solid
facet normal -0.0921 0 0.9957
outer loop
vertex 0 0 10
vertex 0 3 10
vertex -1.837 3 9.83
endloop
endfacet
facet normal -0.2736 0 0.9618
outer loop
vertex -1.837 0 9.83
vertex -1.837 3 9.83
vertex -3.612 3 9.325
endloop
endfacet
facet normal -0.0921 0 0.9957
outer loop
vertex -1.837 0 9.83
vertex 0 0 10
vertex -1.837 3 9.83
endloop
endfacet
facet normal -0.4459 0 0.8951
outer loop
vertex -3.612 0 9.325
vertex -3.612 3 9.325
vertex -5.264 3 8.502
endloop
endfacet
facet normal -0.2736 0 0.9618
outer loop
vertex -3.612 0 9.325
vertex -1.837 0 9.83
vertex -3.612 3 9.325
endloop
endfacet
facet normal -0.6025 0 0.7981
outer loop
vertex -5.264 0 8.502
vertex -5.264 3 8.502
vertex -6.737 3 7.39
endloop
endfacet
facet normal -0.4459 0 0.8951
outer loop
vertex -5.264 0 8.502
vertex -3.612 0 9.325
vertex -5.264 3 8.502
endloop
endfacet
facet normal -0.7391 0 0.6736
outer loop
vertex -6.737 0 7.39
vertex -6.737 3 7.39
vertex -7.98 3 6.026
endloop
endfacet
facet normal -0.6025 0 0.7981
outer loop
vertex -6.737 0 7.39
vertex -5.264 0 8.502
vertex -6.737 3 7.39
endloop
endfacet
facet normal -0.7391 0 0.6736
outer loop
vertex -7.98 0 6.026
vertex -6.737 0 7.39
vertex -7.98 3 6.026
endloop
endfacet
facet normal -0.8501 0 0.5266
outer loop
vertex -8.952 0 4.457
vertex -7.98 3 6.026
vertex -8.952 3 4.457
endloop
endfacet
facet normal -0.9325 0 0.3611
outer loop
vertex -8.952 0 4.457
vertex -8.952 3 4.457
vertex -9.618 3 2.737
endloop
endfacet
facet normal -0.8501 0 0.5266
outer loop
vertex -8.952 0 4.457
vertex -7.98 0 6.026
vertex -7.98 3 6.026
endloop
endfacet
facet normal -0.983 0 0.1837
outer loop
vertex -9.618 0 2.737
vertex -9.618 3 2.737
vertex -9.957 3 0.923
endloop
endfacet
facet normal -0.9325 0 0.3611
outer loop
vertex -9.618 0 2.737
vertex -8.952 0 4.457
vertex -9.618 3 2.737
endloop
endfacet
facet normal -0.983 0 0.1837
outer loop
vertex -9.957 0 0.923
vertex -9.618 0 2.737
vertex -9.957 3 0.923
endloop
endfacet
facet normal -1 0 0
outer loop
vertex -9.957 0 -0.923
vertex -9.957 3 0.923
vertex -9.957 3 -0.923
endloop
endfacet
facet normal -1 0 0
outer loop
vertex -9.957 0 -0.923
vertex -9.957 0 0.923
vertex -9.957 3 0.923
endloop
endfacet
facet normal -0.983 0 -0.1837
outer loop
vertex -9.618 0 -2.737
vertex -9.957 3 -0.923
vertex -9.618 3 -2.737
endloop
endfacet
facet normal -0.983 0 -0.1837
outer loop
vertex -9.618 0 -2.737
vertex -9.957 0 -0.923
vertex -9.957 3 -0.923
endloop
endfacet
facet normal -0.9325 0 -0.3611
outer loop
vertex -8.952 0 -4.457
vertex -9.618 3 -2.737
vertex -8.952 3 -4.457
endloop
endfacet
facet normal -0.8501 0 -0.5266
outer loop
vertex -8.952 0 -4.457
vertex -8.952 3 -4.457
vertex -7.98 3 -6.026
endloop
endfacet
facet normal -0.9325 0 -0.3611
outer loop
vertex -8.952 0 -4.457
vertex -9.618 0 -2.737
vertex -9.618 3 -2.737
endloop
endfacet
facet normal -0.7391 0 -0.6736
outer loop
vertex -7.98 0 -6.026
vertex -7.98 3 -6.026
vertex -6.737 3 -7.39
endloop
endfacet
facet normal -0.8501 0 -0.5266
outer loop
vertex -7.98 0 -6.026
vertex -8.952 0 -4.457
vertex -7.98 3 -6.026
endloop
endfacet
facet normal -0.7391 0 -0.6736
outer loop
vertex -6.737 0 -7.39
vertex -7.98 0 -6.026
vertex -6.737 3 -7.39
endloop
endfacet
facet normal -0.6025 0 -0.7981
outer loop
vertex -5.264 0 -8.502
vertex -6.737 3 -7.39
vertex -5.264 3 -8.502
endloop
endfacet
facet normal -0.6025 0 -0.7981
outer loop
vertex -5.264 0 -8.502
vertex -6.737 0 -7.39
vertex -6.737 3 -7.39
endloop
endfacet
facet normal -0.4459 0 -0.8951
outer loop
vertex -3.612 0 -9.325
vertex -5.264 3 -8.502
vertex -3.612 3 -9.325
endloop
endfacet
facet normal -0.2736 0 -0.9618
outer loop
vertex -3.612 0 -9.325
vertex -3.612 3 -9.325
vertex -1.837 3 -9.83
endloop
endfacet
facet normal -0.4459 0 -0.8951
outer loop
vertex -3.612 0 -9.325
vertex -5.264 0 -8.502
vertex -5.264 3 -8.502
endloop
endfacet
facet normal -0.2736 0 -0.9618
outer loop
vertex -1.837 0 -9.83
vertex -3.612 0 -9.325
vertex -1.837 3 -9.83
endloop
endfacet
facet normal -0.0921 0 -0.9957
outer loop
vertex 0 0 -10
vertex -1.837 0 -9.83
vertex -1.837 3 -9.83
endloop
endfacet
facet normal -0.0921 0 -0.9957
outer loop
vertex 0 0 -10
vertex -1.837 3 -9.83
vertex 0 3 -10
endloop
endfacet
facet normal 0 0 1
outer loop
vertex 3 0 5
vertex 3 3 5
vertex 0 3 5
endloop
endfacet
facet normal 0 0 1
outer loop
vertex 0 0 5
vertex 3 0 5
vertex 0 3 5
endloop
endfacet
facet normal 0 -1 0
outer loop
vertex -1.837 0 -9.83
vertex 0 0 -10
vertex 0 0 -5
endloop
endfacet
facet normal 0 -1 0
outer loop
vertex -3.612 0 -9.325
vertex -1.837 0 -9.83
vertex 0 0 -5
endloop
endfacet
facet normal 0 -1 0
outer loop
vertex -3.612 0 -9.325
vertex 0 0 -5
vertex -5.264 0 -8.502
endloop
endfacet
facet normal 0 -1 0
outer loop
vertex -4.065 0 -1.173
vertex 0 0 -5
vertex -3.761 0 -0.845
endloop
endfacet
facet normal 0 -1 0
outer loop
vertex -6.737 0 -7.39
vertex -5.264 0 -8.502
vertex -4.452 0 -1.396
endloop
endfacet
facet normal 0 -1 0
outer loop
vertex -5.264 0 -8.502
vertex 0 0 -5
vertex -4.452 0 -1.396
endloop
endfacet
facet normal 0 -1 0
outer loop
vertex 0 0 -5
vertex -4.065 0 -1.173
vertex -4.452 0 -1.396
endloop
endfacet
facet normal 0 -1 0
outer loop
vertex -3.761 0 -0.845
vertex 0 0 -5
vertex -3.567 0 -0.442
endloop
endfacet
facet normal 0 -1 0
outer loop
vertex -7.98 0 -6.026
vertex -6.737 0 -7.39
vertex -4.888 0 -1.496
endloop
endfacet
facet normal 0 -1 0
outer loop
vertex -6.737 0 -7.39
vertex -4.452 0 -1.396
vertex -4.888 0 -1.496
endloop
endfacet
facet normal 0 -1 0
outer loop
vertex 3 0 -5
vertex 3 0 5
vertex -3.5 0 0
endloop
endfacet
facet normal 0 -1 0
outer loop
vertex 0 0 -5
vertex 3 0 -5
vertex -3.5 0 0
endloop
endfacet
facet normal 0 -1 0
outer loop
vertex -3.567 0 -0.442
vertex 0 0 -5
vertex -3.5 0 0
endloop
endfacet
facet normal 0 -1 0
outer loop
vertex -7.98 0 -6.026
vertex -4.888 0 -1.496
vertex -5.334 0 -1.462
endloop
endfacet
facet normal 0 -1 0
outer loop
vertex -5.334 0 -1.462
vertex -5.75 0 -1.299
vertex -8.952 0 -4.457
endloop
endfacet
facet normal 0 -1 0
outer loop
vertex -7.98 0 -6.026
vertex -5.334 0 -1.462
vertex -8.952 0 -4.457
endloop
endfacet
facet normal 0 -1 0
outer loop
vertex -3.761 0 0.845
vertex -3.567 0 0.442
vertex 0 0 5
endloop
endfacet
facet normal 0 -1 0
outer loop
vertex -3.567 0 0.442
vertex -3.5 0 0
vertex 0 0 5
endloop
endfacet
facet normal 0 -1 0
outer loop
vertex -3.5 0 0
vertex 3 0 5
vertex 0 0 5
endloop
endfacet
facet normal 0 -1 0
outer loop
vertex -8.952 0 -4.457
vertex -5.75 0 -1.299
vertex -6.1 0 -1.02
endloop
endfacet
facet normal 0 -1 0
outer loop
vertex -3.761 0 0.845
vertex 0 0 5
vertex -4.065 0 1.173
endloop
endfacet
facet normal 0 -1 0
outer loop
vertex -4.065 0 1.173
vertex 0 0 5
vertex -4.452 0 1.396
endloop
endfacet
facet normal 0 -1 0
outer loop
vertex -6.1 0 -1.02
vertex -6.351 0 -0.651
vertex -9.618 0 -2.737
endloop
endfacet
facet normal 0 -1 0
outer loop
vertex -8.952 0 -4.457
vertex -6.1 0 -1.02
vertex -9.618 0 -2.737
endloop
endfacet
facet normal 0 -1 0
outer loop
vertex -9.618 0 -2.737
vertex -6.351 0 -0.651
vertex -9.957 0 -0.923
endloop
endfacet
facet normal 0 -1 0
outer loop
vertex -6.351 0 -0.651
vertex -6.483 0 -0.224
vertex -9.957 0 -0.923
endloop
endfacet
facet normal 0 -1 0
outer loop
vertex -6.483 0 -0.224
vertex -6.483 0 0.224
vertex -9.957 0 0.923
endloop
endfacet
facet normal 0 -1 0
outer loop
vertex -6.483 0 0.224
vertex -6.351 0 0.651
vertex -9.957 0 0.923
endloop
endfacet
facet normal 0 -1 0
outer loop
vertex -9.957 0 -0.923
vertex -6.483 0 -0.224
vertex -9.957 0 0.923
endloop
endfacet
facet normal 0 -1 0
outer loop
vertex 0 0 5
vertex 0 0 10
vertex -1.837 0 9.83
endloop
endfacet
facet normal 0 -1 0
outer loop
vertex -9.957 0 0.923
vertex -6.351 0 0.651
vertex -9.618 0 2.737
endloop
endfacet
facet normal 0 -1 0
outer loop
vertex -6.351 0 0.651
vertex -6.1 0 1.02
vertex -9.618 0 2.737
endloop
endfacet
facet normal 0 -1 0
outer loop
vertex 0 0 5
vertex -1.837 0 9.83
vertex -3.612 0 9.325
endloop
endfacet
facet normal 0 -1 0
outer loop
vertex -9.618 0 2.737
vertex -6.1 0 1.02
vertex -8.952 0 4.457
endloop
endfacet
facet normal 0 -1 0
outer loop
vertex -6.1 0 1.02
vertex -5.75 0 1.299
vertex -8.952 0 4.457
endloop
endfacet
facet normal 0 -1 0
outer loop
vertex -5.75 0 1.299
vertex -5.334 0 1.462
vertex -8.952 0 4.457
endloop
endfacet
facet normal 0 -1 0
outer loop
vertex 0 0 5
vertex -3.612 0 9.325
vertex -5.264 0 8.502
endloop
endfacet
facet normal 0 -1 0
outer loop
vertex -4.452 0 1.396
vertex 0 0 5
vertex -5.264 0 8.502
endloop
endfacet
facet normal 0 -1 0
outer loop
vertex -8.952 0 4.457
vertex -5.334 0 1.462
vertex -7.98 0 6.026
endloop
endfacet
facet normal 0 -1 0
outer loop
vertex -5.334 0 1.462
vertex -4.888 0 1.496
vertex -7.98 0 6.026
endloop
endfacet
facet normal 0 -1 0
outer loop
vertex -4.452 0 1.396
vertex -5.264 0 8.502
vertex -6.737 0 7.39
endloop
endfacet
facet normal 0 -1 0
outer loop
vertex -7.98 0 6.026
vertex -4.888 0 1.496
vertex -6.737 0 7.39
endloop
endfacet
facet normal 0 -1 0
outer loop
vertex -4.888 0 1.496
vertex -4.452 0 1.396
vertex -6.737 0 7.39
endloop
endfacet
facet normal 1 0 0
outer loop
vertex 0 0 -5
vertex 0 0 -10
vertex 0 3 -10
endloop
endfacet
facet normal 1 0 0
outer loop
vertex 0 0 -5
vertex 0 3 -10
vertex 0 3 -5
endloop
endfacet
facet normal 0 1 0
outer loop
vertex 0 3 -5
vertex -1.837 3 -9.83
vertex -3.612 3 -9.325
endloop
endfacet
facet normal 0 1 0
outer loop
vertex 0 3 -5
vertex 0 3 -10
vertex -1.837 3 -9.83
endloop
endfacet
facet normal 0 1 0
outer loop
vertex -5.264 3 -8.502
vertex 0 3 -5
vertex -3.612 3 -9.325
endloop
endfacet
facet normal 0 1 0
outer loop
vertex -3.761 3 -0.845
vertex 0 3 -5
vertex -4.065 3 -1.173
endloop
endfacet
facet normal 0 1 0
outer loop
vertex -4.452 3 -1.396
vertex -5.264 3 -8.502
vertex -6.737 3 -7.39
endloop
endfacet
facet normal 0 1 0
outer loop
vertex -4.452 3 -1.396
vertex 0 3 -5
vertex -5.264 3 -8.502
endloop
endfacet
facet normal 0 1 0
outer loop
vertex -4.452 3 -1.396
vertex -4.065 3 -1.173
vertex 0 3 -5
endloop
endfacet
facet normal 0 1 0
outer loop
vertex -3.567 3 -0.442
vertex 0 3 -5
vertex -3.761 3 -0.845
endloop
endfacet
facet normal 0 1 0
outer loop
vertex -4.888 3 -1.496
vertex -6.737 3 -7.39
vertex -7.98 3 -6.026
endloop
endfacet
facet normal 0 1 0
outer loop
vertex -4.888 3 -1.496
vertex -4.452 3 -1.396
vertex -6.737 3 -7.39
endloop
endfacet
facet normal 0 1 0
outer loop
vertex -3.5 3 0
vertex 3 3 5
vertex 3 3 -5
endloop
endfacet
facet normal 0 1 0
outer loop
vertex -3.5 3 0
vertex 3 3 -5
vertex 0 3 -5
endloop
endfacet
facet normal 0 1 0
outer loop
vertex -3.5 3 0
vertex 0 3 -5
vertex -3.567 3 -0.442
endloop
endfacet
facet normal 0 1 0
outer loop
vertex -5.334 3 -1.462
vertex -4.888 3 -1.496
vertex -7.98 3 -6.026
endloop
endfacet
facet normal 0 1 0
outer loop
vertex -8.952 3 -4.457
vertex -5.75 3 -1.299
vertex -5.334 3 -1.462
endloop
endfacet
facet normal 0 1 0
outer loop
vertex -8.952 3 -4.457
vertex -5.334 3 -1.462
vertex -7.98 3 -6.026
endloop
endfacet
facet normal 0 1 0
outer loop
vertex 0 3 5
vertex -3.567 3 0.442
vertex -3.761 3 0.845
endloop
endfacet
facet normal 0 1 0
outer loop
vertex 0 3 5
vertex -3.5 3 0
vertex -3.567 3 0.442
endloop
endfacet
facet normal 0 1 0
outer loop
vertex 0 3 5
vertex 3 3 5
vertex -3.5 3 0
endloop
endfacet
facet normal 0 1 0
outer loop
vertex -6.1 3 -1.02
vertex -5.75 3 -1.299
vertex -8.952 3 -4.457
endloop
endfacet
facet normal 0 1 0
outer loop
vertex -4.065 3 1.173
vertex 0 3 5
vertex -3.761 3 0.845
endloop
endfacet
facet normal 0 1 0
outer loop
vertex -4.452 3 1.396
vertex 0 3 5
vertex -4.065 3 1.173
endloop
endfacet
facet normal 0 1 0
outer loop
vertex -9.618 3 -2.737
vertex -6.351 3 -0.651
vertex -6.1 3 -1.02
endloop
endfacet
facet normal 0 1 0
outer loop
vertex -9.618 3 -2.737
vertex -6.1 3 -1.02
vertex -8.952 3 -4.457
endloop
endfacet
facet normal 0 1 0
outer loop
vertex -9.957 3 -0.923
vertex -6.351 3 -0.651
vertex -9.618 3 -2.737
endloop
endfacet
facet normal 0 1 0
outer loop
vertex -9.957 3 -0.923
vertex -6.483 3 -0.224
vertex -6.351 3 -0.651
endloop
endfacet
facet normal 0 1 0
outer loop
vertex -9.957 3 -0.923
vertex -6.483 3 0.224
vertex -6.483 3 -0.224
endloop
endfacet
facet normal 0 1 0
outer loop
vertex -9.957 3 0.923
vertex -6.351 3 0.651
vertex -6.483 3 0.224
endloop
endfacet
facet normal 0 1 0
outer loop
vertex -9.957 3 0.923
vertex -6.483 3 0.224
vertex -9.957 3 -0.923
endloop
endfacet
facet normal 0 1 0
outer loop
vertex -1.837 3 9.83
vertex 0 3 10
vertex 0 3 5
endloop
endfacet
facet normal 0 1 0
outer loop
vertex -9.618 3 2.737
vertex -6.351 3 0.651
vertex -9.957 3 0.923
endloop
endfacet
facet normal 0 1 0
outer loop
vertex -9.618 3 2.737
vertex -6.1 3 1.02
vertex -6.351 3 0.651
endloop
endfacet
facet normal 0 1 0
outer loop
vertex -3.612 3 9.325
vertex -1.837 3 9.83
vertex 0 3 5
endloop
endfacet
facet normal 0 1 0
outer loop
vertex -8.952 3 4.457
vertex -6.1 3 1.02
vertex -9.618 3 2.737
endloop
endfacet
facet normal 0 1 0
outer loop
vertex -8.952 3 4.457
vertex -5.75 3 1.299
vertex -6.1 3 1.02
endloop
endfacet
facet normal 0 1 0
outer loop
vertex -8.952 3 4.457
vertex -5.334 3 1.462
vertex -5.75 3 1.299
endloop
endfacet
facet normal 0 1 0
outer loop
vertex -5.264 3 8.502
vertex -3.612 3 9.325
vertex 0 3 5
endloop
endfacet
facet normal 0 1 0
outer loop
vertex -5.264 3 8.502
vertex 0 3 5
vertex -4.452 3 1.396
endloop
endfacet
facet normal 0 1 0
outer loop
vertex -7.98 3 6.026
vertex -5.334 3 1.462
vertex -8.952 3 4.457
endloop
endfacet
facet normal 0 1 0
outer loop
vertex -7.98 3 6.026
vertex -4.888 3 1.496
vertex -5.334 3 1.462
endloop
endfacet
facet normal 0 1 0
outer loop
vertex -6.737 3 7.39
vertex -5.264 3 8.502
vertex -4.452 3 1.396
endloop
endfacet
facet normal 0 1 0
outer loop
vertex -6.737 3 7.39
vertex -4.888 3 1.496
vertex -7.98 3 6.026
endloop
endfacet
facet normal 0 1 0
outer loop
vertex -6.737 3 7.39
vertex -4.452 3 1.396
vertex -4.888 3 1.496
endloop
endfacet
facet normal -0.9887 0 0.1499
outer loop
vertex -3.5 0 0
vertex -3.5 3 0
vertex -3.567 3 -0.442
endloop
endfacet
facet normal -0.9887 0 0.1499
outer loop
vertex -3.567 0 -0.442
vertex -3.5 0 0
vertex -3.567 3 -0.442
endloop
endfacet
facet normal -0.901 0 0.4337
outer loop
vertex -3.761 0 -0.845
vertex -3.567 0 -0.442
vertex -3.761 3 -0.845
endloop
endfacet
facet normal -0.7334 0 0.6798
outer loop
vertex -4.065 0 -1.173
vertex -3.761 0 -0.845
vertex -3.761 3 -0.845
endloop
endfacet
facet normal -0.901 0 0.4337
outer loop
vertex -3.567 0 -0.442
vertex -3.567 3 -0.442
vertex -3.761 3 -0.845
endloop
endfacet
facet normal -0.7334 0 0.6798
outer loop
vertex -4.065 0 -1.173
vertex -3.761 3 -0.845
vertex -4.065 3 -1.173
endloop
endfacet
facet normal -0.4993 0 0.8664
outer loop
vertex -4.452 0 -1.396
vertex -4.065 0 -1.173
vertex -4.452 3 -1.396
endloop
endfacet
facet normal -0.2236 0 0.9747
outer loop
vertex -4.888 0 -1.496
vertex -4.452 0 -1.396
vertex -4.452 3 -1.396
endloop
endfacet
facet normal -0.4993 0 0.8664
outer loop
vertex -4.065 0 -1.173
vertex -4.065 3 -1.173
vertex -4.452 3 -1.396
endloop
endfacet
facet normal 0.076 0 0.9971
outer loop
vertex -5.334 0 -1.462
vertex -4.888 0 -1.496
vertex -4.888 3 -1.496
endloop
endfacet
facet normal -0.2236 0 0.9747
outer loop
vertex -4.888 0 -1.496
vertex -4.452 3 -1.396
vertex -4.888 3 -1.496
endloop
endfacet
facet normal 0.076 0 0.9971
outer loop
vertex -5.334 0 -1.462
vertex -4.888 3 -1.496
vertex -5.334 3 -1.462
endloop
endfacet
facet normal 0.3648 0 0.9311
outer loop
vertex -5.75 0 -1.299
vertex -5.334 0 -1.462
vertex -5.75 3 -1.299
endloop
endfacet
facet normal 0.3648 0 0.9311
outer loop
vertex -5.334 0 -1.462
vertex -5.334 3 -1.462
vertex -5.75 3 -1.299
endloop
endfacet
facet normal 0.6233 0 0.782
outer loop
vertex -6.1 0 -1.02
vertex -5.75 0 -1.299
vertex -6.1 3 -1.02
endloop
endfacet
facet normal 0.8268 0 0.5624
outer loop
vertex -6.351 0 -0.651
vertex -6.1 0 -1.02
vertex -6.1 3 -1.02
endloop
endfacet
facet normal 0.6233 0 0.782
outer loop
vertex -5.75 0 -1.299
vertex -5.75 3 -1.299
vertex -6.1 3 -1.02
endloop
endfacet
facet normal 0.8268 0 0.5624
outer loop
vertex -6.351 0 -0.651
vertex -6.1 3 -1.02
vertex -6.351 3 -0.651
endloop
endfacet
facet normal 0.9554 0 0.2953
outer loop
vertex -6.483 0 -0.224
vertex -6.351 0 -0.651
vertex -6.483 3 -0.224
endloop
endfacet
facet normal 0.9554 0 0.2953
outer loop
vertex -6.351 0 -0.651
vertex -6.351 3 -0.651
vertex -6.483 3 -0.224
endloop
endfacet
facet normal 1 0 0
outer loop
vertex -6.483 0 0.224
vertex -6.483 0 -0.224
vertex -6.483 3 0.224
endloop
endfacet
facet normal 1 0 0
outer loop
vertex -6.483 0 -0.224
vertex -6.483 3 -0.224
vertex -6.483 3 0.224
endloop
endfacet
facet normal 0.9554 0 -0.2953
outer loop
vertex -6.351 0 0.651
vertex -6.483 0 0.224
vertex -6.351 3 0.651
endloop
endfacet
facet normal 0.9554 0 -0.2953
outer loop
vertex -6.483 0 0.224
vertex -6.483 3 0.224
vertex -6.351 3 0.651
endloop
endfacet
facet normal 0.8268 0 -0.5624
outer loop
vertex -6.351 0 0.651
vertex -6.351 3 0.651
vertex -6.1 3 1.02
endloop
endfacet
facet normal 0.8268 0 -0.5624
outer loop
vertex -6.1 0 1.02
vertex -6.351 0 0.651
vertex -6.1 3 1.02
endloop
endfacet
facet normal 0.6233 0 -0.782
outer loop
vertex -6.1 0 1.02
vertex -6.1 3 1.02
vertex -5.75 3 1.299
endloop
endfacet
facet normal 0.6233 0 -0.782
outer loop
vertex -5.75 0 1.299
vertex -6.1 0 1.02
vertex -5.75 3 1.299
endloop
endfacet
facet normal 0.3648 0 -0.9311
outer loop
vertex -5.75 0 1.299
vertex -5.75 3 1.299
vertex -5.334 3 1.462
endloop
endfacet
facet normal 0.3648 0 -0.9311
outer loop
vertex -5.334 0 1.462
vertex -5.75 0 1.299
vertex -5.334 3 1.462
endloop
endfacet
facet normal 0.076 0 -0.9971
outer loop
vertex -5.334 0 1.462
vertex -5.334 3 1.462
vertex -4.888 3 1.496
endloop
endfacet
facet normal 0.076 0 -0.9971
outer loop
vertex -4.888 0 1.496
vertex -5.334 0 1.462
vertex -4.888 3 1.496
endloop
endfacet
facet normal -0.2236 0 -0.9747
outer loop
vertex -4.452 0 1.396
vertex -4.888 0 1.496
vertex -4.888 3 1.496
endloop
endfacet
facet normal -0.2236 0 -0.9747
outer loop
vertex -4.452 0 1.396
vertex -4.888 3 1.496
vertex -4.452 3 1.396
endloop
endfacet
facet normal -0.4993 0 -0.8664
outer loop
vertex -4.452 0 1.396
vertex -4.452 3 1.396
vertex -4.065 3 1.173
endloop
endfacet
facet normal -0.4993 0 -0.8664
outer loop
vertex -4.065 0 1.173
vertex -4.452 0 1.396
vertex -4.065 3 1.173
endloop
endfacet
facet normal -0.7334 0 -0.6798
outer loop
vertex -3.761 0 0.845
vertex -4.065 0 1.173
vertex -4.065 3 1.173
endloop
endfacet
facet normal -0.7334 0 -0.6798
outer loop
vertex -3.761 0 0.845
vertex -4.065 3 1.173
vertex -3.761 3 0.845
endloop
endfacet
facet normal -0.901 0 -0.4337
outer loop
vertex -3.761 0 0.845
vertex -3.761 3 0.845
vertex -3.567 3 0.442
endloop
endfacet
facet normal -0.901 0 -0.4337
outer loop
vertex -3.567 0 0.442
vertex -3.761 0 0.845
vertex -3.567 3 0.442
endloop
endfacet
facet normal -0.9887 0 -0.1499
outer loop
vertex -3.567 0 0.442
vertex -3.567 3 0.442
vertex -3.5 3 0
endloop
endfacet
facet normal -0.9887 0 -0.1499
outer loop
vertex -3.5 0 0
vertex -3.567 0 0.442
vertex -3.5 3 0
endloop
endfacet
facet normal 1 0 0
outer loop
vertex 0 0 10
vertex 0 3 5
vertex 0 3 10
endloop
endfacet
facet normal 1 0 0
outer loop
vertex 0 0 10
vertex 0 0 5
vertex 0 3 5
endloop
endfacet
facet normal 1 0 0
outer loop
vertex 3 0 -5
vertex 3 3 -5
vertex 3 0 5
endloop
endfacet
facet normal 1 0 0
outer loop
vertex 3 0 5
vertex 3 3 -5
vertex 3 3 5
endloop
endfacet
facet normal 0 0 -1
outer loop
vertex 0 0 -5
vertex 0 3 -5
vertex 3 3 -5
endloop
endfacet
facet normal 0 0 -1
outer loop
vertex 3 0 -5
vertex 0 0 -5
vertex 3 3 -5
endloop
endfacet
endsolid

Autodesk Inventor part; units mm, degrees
ref_plane "YZ Plane" through (0, 0, 0) normal (1, 0, 0) x (0, 1, 0)
ref_plane "XZ Plane" through (0, 0, 0) normal (0, 1, 0) x (-1, 0, 0)
ref_plane "XY Plane" through (0, 0, 0) normal (0, 0, 1) x (1, 0, 0)
sketch "Sketch1" plane through (0, 0, 0) normal (0, 1, 0) x (-1, 0, 0)
  circle A0 centre (0, 0) radius 10
  line L0 (0, -10) -> (0, 10)
  dimension "d0" = 20
extrude "Extrusion1" add sketch "Sketch1" along normal blind 3 contours A0 L0 picked at (2.6061, 2.0783)
sketch "Sketch2" plane through (0, 3, 0) normal (0, 1, 0) x (1, 0, 0)
  line L0 (0, 5) -> (3, 5)
  line L1 (3, 5) -> (3, -5)
  line L2 (3, -5) -> (0, -5)
  line L3 (0, -5) -> (0, 5)
  line L4 (0, -10) -> (0, 10) projected
  point P0 (0, 0)
  point P1 (3, 0)
  point P2 (0, 0)
  dimension "d3" = 3
  dimension "d4" = 10
extrude "Extrusion2" add sketch "Sketch2" against normal blind 3
sketch "Sketch3" plane through (0, 3, 0) normal (0, 1, 0) x (1, 0, 0)
  circle A0 centre (-5, 0) radius 1.5
  line L0 (0, -10) -> (0, -5) projected
  point P0 (0, 0)
  dimension "d7" = 3
  dimension "d8" = 5
extrude "Extrusion3" cut sketch "Sketch3" against normal blind 3
properties part number "Cradel holder"
